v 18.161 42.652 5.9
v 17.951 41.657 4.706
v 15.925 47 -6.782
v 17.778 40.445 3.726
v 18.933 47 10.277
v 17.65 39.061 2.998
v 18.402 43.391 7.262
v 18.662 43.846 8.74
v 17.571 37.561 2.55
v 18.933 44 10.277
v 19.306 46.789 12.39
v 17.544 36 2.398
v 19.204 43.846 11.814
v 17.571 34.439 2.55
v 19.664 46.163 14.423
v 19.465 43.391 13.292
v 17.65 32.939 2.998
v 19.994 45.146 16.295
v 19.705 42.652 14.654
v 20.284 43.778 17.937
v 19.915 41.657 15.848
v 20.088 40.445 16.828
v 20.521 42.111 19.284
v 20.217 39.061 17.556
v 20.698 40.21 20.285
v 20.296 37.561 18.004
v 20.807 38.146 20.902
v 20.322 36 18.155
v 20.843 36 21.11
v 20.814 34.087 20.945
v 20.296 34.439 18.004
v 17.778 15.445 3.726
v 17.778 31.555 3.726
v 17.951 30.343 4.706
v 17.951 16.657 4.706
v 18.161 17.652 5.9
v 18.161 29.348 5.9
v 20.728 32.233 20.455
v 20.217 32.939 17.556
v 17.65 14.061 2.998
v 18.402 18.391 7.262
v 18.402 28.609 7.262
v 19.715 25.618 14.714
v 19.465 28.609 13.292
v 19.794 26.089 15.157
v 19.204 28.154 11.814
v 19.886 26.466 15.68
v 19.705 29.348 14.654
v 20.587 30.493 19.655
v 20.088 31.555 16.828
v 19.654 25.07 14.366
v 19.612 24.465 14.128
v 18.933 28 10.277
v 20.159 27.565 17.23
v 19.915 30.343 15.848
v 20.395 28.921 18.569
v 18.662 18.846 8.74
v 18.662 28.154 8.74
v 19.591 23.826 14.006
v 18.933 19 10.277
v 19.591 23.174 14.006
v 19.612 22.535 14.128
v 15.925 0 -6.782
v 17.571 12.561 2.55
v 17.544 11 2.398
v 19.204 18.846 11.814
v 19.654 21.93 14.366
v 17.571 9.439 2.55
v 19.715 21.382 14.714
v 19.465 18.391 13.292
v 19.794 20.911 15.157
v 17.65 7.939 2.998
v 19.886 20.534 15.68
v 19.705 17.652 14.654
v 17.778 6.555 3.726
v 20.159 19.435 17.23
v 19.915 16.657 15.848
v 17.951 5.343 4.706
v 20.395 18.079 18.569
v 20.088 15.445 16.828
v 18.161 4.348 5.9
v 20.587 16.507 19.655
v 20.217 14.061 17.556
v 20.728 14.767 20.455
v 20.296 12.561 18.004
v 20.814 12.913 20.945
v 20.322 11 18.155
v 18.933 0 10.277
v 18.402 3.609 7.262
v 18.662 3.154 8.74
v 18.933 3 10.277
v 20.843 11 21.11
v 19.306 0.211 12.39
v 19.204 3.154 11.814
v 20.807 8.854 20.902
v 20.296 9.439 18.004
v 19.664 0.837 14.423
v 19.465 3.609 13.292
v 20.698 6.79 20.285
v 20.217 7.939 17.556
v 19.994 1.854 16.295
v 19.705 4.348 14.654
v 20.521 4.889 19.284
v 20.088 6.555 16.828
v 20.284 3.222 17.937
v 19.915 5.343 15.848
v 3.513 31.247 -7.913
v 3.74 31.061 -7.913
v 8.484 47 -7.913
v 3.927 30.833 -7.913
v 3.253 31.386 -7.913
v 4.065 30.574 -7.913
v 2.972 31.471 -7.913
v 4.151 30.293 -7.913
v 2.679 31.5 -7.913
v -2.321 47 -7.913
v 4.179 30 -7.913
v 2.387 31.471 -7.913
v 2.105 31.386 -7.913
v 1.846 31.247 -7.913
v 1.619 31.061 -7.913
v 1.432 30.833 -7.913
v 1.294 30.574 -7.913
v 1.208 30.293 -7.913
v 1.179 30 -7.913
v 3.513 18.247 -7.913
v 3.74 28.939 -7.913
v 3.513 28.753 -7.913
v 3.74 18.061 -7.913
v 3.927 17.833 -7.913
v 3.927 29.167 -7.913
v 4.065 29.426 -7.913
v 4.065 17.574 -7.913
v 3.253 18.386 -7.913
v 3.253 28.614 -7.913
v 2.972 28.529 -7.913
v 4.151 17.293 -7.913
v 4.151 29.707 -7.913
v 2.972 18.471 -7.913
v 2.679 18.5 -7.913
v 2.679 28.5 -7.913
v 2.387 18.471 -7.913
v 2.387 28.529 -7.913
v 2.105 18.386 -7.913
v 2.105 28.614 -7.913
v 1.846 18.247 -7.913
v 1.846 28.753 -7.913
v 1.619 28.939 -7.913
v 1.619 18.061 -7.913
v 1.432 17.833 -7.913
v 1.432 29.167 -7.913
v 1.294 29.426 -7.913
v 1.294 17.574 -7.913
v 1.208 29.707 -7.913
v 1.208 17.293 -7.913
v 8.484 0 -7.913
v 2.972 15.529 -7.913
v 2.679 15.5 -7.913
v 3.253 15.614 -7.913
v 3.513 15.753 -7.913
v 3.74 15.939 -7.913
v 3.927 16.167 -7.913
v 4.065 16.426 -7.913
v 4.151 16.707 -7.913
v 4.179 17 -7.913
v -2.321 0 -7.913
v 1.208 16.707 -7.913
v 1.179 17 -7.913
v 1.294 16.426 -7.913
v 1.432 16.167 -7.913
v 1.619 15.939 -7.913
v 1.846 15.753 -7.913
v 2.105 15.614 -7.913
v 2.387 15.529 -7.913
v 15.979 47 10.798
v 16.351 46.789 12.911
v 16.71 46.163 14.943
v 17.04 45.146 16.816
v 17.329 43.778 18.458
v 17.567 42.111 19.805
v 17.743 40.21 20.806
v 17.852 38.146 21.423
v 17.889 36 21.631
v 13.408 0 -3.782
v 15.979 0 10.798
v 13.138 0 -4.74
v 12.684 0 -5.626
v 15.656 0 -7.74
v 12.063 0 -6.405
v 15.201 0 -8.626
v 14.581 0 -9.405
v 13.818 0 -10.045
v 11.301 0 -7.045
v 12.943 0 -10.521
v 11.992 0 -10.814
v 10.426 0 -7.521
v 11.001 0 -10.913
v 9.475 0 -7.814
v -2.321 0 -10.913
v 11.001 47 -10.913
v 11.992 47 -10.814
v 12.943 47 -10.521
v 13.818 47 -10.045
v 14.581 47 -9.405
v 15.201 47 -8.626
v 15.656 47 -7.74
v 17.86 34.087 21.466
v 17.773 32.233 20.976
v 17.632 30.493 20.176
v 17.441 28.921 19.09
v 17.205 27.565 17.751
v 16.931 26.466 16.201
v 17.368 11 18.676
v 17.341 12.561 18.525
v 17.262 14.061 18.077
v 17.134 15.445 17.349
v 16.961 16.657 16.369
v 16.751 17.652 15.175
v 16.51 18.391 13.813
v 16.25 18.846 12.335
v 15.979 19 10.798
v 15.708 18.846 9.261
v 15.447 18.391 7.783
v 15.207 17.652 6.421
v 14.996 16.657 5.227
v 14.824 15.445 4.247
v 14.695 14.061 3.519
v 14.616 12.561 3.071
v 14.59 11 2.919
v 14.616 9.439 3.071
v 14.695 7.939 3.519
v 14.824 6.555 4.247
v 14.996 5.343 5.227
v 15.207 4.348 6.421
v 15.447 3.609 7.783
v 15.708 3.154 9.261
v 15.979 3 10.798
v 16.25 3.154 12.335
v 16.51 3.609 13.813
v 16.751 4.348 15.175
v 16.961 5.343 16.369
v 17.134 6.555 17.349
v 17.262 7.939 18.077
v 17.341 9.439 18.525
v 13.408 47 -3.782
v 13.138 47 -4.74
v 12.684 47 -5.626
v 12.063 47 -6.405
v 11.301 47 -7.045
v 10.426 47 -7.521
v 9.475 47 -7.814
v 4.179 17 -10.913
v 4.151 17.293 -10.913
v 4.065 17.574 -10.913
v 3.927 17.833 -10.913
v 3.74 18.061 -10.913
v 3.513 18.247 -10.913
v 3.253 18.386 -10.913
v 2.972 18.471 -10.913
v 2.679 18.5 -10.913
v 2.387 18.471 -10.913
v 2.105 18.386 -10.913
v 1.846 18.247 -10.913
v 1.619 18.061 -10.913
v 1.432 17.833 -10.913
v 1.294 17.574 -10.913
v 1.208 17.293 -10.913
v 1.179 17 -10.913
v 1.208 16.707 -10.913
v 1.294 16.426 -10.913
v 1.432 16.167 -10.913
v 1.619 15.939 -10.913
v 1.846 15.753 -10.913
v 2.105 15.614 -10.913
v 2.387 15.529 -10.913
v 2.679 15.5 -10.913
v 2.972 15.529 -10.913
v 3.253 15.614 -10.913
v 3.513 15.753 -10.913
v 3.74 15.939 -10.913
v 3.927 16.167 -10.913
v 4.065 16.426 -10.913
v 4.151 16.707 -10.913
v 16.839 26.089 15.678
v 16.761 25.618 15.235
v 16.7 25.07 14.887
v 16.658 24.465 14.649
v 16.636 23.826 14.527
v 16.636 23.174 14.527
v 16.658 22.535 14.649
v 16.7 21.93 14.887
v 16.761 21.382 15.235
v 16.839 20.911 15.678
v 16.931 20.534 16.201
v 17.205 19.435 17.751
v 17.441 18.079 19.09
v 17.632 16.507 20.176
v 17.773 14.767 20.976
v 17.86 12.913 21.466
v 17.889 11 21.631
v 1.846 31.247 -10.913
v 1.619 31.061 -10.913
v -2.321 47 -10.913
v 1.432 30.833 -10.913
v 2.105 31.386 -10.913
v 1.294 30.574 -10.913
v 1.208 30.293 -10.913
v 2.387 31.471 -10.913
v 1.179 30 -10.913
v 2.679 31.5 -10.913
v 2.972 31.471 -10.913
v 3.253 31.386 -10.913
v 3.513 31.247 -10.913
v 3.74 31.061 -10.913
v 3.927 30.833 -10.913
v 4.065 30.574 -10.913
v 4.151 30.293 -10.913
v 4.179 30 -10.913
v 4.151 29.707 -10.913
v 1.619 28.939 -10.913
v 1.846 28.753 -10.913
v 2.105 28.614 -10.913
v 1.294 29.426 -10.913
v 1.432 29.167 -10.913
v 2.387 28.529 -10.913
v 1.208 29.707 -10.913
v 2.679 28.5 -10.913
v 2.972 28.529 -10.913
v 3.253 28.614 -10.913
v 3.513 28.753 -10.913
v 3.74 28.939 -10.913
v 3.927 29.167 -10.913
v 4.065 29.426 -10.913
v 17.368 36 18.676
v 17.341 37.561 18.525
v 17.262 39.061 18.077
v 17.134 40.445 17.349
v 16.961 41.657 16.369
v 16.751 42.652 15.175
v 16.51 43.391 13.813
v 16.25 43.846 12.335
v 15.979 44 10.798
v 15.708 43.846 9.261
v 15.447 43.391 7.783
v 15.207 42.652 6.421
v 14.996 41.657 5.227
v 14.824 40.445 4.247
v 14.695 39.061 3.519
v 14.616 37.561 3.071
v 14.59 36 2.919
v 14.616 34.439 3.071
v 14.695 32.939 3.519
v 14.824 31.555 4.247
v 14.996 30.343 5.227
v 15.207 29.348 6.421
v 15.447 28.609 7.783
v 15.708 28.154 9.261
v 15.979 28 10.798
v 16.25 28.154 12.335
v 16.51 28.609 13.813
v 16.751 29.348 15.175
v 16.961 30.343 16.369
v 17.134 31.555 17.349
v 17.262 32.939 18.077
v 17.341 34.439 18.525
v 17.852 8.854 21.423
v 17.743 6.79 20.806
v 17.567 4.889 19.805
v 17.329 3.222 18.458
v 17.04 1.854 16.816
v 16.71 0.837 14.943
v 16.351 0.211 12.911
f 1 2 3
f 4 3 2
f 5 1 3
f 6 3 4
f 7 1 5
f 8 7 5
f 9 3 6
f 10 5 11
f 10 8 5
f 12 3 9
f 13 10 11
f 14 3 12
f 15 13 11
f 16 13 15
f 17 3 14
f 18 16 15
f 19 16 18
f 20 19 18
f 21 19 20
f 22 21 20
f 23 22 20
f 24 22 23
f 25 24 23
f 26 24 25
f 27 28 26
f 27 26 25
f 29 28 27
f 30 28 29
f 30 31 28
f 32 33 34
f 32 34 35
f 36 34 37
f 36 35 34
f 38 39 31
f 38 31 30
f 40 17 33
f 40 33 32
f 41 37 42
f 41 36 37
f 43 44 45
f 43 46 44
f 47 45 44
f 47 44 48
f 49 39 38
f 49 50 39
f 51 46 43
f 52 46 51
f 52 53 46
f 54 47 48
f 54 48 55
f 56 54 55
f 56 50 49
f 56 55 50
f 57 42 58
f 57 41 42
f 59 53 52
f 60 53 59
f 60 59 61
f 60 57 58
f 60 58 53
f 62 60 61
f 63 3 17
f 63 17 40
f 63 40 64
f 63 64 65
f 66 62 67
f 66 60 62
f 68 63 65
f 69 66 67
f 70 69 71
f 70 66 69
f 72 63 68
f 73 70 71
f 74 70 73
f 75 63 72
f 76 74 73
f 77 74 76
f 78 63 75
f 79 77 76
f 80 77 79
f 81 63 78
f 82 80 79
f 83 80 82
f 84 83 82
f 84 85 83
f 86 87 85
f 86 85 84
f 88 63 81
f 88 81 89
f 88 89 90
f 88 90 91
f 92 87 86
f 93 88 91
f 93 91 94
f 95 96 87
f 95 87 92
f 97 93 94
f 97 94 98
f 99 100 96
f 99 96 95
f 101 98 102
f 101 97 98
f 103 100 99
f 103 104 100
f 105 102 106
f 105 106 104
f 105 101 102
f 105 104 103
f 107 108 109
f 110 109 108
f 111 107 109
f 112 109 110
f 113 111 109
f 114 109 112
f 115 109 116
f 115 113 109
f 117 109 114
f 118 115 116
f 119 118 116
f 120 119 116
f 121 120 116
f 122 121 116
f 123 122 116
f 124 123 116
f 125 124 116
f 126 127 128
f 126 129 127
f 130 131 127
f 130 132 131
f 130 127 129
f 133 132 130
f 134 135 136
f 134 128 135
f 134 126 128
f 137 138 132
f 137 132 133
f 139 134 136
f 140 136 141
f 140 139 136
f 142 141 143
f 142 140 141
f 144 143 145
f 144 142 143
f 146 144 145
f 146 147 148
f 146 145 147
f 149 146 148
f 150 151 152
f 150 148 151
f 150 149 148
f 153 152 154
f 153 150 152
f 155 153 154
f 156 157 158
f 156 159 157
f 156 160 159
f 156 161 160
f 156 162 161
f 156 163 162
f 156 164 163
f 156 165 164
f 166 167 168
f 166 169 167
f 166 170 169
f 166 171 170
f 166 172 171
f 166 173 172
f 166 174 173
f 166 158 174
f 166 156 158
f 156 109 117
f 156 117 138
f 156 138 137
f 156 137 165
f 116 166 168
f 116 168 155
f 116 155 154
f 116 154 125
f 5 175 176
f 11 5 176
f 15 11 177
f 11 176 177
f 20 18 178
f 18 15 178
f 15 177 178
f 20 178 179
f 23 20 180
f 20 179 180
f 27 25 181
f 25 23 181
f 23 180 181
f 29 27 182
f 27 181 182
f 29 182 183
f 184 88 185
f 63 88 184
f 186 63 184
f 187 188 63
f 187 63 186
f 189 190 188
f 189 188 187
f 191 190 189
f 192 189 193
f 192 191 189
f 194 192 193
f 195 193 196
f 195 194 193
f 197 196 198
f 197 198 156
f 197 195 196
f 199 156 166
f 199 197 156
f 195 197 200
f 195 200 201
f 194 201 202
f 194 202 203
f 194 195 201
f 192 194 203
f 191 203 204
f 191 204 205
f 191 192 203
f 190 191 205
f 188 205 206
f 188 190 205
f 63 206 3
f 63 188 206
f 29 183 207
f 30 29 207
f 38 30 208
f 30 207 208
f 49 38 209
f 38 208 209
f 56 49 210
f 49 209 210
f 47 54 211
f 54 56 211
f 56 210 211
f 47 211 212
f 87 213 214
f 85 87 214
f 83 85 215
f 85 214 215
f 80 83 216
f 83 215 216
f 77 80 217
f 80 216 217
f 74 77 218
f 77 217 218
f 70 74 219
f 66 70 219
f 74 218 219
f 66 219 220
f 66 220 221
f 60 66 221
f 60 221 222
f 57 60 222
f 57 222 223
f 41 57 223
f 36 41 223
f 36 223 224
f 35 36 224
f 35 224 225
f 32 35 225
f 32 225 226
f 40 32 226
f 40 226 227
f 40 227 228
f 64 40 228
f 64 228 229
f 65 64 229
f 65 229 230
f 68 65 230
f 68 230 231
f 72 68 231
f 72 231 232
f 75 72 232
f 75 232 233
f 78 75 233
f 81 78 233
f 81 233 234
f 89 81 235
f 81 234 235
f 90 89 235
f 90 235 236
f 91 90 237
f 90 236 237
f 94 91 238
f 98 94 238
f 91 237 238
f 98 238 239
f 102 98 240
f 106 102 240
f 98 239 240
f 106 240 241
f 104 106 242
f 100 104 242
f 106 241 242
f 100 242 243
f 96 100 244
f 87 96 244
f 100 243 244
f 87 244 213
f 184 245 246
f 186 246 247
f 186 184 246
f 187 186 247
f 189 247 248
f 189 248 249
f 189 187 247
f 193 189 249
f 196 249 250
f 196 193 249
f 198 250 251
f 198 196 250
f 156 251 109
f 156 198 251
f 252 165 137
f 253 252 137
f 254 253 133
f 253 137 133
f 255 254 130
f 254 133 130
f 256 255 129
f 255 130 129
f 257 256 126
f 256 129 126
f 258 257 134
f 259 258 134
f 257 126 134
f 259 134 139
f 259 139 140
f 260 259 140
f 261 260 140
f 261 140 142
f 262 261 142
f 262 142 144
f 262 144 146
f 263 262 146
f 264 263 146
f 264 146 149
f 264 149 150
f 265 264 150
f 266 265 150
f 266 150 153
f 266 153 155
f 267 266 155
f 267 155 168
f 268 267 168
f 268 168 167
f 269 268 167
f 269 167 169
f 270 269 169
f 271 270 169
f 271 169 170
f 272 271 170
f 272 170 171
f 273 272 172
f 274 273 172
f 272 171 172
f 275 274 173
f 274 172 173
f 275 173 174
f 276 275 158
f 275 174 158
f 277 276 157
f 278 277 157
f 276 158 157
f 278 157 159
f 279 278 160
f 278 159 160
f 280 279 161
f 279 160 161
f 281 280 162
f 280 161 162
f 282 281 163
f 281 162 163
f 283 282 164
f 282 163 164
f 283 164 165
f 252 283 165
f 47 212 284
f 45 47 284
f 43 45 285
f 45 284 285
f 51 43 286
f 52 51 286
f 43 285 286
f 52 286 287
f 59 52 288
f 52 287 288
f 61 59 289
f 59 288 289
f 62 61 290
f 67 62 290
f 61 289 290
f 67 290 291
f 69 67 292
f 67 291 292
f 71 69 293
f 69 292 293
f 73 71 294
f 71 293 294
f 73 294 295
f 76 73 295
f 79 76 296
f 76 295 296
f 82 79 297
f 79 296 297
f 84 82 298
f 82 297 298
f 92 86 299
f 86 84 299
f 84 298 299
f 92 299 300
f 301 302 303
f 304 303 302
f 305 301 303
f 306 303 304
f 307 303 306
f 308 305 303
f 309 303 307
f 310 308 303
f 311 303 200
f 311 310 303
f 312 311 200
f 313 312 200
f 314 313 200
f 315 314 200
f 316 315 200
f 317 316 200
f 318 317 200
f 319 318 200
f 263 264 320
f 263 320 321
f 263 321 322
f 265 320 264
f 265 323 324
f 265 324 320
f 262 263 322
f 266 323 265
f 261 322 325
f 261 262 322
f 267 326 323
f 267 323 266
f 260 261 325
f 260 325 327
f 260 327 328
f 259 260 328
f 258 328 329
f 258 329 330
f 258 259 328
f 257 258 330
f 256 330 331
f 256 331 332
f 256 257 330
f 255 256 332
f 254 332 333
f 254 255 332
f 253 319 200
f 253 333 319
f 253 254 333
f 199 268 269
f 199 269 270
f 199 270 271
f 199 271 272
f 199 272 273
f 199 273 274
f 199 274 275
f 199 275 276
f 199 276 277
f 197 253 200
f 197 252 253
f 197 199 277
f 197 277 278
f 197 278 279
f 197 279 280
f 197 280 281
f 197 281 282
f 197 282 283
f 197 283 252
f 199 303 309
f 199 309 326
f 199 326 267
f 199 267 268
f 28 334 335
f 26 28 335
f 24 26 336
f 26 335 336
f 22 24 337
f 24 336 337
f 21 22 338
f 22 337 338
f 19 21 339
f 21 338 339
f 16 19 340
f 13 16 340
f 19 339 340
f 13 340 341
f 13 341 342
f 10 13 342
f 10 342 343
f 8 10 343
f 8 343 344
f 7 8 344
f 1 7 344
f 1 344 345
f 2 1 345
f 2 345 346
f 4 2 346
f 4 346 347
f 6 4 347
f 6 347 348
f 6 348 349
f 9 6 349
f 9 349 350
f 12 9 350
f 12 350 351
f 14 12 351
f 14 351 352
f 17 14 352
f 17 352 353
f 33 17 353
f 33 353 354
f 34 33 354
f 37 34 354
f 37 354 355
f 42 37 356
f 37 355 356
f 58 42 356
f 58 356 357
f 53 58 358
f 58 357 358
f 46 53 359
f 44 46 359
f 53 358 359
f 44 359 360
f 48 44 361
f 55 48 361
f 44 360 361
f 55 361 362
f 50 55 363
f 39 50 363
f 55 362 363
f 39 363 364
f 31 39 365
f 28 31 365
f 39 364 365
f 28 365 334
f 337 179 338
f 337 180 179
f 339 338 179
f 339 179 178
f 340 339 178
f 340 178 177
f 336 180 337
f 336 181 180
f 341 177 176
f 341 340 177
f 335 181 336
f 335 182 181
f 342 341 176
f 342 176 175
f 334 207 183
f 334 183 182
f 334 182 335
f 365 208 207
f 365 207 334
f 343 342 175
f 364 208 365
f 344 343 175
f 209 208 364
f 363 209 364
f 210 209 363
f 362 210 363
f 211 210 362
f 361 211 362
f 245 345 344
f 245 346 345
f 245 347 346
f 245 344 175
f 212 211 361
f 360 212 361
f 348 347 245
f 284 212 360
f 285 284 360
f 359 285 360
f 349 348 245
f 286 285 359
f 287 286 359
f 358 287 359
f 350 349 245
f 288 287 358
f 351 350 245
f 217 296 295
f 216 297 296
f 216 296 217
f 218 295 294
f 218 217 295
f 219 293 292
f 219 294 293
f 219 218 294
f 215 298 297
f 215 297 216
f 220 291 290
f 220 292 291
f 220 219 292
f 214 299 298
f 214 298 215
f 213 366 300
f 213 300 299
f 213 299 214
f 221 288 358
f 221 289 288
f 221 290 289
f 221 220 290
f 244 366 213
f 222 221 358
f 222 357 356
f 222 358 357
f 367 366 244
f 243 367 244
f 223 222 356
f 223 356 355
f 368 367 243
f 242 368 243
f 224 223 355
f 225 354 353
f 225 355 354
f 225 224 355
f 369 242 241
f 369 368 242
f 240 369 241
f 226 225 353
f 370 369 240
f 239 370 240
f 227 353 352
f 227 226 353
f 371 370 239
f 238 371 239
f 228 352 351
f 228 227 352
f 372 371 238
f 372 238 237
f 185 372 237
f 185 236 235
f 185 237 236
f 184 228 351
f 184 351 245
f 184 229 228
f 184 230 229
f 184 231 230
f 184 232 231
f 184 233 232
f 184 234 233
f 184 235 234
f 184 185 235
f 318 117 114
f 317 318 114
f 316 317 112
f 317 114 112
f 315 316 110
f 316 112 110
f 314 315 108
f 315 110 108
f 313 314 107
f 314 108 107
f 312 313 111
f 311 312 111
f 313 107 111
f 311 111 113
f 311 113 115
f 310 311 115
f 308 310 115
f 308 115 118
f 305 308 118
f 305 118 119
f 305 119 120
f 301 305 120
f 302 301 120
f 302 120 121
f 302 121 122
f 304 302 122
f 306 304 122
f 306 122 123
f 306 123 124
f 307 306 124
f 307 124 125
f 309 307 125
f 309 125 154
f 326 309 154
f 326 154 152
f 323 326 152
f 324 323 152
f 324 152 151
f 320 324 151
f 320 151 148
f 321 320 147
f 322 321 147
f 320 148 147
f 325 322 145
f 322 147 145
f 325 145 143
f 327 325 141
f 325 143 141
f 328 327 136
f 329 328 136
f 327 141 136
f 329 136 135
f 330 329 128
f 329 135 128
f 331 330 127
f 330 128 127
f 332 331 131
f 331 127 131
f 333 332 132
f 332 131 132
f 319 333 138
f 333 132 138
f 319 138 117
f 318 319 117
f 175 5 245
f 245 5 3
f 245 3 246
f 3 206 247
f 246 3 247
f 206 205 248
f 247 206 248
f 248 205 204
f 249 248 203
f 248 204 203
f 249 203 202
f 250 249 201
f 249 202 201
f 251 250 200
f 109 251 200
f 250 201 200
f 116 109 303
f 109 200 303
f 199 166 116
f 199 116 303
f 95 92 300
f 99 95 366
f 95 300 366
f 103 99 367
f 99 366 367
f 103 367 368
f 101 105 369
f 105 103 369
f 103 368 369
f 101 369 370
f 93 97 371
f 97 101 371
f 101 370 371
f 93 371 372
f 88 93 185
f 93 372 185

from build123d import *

# Parameters (mm, degrees)
BOSS_EXTRUDE1_DEPTH = 47
SKETCH2_R           = 1.5
CUT_EXTRUDE1_DEPTH  = 4
SKETCH3_R           = 8
CUT_EXTRUDE2_DEPTH  = 9.560785614


with BuildPart() as part:
    # Sketch1 → Boss-Extrude1 (new body)
    with BuildSketch(Plane(origin=(0, 0, 0), x_dir=(1, 0, 0), z_dir=(0, 1, 0))):
        with BuildLine():
            Line((-2.32059976, 10.913457617), (11.001200978, 10.913457617))
            ThreePointArc((11.001200978, 10.913457617), (14.215139026, 9.743679833), (15.925239743, 6.781698506))
            Line((15.925239743, 6.781698506), (20.843268829, -21.10983044))
            Line((20.843268829, -21.10983044), (17.88884557, -21.630774973))
            Line((17.88884557, -21.630774973), (13.407940849, 3.781698506))
            ThreePointArc((13.407940849, 3.781698506), (11.697840132, 6.743679833), (8.483902084, 7.913457617))
            Line((8.483902084, 7.913457617), (-2.32059976, 7.913457617))
            Line((-2.32059976, 7.913457617), (-2.32059976, 10.913457617))
        make_face()
    extrude(amount=BOSS_EXTRUDE1_DEPTH)

    # Sketch2 → Cut-Extrude1 (cut, through all)
    with BuildSketch(Plane.XY.offset(-7.913457617)):
        with Locations((2.67940024, 30)):
            Circle(SKETCH2_R)
        with Locations((2.67940024, 17)):
            Circle(SKETCH2_R)
    extrude(amount=-CUT_EXTRUDE1_DEPTH, mode=Mode.SUBTRACT)

    # Sketch3 → Cut-Extrude2 (cut, through all)
    with BuildSketch(Plane(origin=(13.650350495, 0, -2.406925088), x_dir=(0.173648178, 0, 0.984807753), z_dir=(-0.984807753, 0, 0.173648178))):
        with BuildLine():
            Line((24.408520331, 47), (13.408520331, 47))
            ThreePointArc((13.408520331, 47), (21.186694924, 43.778174593), (24.408520331, 36))
            Line((24.408520331, 36), (24.408520331, 47))
        make_face()
        with BuildLine():
            Line((24.408520331, 0), (24.408520331, 11))
            ThreePointArc((24.408520331, 11), (21.186694924, 3.221825407), (13.408520331, 0))
            Line((13.408520331, 0), (24.408520331, 0))
        make_face()
        with Locations((13.408520331, 11)):
            Circle(SKETCH3_R)
        with Locations((13.408520331, 36)):
            Circle(SKETCH3_R)
        with BuildLine():
            Line((24.408520331, 11), (24.408520331, 36))
            ThreePointArc((24.408520331, 36), (22.930853605, 30.493170692), (18.894853235, 26.465842918))
            ThreePointArc((18.894853235, 26.465842918), (17.17968635, 23.5), (18.894853235, 20.534157082))
            ThreePointArc((18.894853235, 20.534157082), (22.930853605, 16.506829308), (24.408520331, 11))
        make_face()
    extrude(amount=-CUT_EXTRUDE2_DEPTH, mode=Mode.SUBTRACT)


solid = part.part
